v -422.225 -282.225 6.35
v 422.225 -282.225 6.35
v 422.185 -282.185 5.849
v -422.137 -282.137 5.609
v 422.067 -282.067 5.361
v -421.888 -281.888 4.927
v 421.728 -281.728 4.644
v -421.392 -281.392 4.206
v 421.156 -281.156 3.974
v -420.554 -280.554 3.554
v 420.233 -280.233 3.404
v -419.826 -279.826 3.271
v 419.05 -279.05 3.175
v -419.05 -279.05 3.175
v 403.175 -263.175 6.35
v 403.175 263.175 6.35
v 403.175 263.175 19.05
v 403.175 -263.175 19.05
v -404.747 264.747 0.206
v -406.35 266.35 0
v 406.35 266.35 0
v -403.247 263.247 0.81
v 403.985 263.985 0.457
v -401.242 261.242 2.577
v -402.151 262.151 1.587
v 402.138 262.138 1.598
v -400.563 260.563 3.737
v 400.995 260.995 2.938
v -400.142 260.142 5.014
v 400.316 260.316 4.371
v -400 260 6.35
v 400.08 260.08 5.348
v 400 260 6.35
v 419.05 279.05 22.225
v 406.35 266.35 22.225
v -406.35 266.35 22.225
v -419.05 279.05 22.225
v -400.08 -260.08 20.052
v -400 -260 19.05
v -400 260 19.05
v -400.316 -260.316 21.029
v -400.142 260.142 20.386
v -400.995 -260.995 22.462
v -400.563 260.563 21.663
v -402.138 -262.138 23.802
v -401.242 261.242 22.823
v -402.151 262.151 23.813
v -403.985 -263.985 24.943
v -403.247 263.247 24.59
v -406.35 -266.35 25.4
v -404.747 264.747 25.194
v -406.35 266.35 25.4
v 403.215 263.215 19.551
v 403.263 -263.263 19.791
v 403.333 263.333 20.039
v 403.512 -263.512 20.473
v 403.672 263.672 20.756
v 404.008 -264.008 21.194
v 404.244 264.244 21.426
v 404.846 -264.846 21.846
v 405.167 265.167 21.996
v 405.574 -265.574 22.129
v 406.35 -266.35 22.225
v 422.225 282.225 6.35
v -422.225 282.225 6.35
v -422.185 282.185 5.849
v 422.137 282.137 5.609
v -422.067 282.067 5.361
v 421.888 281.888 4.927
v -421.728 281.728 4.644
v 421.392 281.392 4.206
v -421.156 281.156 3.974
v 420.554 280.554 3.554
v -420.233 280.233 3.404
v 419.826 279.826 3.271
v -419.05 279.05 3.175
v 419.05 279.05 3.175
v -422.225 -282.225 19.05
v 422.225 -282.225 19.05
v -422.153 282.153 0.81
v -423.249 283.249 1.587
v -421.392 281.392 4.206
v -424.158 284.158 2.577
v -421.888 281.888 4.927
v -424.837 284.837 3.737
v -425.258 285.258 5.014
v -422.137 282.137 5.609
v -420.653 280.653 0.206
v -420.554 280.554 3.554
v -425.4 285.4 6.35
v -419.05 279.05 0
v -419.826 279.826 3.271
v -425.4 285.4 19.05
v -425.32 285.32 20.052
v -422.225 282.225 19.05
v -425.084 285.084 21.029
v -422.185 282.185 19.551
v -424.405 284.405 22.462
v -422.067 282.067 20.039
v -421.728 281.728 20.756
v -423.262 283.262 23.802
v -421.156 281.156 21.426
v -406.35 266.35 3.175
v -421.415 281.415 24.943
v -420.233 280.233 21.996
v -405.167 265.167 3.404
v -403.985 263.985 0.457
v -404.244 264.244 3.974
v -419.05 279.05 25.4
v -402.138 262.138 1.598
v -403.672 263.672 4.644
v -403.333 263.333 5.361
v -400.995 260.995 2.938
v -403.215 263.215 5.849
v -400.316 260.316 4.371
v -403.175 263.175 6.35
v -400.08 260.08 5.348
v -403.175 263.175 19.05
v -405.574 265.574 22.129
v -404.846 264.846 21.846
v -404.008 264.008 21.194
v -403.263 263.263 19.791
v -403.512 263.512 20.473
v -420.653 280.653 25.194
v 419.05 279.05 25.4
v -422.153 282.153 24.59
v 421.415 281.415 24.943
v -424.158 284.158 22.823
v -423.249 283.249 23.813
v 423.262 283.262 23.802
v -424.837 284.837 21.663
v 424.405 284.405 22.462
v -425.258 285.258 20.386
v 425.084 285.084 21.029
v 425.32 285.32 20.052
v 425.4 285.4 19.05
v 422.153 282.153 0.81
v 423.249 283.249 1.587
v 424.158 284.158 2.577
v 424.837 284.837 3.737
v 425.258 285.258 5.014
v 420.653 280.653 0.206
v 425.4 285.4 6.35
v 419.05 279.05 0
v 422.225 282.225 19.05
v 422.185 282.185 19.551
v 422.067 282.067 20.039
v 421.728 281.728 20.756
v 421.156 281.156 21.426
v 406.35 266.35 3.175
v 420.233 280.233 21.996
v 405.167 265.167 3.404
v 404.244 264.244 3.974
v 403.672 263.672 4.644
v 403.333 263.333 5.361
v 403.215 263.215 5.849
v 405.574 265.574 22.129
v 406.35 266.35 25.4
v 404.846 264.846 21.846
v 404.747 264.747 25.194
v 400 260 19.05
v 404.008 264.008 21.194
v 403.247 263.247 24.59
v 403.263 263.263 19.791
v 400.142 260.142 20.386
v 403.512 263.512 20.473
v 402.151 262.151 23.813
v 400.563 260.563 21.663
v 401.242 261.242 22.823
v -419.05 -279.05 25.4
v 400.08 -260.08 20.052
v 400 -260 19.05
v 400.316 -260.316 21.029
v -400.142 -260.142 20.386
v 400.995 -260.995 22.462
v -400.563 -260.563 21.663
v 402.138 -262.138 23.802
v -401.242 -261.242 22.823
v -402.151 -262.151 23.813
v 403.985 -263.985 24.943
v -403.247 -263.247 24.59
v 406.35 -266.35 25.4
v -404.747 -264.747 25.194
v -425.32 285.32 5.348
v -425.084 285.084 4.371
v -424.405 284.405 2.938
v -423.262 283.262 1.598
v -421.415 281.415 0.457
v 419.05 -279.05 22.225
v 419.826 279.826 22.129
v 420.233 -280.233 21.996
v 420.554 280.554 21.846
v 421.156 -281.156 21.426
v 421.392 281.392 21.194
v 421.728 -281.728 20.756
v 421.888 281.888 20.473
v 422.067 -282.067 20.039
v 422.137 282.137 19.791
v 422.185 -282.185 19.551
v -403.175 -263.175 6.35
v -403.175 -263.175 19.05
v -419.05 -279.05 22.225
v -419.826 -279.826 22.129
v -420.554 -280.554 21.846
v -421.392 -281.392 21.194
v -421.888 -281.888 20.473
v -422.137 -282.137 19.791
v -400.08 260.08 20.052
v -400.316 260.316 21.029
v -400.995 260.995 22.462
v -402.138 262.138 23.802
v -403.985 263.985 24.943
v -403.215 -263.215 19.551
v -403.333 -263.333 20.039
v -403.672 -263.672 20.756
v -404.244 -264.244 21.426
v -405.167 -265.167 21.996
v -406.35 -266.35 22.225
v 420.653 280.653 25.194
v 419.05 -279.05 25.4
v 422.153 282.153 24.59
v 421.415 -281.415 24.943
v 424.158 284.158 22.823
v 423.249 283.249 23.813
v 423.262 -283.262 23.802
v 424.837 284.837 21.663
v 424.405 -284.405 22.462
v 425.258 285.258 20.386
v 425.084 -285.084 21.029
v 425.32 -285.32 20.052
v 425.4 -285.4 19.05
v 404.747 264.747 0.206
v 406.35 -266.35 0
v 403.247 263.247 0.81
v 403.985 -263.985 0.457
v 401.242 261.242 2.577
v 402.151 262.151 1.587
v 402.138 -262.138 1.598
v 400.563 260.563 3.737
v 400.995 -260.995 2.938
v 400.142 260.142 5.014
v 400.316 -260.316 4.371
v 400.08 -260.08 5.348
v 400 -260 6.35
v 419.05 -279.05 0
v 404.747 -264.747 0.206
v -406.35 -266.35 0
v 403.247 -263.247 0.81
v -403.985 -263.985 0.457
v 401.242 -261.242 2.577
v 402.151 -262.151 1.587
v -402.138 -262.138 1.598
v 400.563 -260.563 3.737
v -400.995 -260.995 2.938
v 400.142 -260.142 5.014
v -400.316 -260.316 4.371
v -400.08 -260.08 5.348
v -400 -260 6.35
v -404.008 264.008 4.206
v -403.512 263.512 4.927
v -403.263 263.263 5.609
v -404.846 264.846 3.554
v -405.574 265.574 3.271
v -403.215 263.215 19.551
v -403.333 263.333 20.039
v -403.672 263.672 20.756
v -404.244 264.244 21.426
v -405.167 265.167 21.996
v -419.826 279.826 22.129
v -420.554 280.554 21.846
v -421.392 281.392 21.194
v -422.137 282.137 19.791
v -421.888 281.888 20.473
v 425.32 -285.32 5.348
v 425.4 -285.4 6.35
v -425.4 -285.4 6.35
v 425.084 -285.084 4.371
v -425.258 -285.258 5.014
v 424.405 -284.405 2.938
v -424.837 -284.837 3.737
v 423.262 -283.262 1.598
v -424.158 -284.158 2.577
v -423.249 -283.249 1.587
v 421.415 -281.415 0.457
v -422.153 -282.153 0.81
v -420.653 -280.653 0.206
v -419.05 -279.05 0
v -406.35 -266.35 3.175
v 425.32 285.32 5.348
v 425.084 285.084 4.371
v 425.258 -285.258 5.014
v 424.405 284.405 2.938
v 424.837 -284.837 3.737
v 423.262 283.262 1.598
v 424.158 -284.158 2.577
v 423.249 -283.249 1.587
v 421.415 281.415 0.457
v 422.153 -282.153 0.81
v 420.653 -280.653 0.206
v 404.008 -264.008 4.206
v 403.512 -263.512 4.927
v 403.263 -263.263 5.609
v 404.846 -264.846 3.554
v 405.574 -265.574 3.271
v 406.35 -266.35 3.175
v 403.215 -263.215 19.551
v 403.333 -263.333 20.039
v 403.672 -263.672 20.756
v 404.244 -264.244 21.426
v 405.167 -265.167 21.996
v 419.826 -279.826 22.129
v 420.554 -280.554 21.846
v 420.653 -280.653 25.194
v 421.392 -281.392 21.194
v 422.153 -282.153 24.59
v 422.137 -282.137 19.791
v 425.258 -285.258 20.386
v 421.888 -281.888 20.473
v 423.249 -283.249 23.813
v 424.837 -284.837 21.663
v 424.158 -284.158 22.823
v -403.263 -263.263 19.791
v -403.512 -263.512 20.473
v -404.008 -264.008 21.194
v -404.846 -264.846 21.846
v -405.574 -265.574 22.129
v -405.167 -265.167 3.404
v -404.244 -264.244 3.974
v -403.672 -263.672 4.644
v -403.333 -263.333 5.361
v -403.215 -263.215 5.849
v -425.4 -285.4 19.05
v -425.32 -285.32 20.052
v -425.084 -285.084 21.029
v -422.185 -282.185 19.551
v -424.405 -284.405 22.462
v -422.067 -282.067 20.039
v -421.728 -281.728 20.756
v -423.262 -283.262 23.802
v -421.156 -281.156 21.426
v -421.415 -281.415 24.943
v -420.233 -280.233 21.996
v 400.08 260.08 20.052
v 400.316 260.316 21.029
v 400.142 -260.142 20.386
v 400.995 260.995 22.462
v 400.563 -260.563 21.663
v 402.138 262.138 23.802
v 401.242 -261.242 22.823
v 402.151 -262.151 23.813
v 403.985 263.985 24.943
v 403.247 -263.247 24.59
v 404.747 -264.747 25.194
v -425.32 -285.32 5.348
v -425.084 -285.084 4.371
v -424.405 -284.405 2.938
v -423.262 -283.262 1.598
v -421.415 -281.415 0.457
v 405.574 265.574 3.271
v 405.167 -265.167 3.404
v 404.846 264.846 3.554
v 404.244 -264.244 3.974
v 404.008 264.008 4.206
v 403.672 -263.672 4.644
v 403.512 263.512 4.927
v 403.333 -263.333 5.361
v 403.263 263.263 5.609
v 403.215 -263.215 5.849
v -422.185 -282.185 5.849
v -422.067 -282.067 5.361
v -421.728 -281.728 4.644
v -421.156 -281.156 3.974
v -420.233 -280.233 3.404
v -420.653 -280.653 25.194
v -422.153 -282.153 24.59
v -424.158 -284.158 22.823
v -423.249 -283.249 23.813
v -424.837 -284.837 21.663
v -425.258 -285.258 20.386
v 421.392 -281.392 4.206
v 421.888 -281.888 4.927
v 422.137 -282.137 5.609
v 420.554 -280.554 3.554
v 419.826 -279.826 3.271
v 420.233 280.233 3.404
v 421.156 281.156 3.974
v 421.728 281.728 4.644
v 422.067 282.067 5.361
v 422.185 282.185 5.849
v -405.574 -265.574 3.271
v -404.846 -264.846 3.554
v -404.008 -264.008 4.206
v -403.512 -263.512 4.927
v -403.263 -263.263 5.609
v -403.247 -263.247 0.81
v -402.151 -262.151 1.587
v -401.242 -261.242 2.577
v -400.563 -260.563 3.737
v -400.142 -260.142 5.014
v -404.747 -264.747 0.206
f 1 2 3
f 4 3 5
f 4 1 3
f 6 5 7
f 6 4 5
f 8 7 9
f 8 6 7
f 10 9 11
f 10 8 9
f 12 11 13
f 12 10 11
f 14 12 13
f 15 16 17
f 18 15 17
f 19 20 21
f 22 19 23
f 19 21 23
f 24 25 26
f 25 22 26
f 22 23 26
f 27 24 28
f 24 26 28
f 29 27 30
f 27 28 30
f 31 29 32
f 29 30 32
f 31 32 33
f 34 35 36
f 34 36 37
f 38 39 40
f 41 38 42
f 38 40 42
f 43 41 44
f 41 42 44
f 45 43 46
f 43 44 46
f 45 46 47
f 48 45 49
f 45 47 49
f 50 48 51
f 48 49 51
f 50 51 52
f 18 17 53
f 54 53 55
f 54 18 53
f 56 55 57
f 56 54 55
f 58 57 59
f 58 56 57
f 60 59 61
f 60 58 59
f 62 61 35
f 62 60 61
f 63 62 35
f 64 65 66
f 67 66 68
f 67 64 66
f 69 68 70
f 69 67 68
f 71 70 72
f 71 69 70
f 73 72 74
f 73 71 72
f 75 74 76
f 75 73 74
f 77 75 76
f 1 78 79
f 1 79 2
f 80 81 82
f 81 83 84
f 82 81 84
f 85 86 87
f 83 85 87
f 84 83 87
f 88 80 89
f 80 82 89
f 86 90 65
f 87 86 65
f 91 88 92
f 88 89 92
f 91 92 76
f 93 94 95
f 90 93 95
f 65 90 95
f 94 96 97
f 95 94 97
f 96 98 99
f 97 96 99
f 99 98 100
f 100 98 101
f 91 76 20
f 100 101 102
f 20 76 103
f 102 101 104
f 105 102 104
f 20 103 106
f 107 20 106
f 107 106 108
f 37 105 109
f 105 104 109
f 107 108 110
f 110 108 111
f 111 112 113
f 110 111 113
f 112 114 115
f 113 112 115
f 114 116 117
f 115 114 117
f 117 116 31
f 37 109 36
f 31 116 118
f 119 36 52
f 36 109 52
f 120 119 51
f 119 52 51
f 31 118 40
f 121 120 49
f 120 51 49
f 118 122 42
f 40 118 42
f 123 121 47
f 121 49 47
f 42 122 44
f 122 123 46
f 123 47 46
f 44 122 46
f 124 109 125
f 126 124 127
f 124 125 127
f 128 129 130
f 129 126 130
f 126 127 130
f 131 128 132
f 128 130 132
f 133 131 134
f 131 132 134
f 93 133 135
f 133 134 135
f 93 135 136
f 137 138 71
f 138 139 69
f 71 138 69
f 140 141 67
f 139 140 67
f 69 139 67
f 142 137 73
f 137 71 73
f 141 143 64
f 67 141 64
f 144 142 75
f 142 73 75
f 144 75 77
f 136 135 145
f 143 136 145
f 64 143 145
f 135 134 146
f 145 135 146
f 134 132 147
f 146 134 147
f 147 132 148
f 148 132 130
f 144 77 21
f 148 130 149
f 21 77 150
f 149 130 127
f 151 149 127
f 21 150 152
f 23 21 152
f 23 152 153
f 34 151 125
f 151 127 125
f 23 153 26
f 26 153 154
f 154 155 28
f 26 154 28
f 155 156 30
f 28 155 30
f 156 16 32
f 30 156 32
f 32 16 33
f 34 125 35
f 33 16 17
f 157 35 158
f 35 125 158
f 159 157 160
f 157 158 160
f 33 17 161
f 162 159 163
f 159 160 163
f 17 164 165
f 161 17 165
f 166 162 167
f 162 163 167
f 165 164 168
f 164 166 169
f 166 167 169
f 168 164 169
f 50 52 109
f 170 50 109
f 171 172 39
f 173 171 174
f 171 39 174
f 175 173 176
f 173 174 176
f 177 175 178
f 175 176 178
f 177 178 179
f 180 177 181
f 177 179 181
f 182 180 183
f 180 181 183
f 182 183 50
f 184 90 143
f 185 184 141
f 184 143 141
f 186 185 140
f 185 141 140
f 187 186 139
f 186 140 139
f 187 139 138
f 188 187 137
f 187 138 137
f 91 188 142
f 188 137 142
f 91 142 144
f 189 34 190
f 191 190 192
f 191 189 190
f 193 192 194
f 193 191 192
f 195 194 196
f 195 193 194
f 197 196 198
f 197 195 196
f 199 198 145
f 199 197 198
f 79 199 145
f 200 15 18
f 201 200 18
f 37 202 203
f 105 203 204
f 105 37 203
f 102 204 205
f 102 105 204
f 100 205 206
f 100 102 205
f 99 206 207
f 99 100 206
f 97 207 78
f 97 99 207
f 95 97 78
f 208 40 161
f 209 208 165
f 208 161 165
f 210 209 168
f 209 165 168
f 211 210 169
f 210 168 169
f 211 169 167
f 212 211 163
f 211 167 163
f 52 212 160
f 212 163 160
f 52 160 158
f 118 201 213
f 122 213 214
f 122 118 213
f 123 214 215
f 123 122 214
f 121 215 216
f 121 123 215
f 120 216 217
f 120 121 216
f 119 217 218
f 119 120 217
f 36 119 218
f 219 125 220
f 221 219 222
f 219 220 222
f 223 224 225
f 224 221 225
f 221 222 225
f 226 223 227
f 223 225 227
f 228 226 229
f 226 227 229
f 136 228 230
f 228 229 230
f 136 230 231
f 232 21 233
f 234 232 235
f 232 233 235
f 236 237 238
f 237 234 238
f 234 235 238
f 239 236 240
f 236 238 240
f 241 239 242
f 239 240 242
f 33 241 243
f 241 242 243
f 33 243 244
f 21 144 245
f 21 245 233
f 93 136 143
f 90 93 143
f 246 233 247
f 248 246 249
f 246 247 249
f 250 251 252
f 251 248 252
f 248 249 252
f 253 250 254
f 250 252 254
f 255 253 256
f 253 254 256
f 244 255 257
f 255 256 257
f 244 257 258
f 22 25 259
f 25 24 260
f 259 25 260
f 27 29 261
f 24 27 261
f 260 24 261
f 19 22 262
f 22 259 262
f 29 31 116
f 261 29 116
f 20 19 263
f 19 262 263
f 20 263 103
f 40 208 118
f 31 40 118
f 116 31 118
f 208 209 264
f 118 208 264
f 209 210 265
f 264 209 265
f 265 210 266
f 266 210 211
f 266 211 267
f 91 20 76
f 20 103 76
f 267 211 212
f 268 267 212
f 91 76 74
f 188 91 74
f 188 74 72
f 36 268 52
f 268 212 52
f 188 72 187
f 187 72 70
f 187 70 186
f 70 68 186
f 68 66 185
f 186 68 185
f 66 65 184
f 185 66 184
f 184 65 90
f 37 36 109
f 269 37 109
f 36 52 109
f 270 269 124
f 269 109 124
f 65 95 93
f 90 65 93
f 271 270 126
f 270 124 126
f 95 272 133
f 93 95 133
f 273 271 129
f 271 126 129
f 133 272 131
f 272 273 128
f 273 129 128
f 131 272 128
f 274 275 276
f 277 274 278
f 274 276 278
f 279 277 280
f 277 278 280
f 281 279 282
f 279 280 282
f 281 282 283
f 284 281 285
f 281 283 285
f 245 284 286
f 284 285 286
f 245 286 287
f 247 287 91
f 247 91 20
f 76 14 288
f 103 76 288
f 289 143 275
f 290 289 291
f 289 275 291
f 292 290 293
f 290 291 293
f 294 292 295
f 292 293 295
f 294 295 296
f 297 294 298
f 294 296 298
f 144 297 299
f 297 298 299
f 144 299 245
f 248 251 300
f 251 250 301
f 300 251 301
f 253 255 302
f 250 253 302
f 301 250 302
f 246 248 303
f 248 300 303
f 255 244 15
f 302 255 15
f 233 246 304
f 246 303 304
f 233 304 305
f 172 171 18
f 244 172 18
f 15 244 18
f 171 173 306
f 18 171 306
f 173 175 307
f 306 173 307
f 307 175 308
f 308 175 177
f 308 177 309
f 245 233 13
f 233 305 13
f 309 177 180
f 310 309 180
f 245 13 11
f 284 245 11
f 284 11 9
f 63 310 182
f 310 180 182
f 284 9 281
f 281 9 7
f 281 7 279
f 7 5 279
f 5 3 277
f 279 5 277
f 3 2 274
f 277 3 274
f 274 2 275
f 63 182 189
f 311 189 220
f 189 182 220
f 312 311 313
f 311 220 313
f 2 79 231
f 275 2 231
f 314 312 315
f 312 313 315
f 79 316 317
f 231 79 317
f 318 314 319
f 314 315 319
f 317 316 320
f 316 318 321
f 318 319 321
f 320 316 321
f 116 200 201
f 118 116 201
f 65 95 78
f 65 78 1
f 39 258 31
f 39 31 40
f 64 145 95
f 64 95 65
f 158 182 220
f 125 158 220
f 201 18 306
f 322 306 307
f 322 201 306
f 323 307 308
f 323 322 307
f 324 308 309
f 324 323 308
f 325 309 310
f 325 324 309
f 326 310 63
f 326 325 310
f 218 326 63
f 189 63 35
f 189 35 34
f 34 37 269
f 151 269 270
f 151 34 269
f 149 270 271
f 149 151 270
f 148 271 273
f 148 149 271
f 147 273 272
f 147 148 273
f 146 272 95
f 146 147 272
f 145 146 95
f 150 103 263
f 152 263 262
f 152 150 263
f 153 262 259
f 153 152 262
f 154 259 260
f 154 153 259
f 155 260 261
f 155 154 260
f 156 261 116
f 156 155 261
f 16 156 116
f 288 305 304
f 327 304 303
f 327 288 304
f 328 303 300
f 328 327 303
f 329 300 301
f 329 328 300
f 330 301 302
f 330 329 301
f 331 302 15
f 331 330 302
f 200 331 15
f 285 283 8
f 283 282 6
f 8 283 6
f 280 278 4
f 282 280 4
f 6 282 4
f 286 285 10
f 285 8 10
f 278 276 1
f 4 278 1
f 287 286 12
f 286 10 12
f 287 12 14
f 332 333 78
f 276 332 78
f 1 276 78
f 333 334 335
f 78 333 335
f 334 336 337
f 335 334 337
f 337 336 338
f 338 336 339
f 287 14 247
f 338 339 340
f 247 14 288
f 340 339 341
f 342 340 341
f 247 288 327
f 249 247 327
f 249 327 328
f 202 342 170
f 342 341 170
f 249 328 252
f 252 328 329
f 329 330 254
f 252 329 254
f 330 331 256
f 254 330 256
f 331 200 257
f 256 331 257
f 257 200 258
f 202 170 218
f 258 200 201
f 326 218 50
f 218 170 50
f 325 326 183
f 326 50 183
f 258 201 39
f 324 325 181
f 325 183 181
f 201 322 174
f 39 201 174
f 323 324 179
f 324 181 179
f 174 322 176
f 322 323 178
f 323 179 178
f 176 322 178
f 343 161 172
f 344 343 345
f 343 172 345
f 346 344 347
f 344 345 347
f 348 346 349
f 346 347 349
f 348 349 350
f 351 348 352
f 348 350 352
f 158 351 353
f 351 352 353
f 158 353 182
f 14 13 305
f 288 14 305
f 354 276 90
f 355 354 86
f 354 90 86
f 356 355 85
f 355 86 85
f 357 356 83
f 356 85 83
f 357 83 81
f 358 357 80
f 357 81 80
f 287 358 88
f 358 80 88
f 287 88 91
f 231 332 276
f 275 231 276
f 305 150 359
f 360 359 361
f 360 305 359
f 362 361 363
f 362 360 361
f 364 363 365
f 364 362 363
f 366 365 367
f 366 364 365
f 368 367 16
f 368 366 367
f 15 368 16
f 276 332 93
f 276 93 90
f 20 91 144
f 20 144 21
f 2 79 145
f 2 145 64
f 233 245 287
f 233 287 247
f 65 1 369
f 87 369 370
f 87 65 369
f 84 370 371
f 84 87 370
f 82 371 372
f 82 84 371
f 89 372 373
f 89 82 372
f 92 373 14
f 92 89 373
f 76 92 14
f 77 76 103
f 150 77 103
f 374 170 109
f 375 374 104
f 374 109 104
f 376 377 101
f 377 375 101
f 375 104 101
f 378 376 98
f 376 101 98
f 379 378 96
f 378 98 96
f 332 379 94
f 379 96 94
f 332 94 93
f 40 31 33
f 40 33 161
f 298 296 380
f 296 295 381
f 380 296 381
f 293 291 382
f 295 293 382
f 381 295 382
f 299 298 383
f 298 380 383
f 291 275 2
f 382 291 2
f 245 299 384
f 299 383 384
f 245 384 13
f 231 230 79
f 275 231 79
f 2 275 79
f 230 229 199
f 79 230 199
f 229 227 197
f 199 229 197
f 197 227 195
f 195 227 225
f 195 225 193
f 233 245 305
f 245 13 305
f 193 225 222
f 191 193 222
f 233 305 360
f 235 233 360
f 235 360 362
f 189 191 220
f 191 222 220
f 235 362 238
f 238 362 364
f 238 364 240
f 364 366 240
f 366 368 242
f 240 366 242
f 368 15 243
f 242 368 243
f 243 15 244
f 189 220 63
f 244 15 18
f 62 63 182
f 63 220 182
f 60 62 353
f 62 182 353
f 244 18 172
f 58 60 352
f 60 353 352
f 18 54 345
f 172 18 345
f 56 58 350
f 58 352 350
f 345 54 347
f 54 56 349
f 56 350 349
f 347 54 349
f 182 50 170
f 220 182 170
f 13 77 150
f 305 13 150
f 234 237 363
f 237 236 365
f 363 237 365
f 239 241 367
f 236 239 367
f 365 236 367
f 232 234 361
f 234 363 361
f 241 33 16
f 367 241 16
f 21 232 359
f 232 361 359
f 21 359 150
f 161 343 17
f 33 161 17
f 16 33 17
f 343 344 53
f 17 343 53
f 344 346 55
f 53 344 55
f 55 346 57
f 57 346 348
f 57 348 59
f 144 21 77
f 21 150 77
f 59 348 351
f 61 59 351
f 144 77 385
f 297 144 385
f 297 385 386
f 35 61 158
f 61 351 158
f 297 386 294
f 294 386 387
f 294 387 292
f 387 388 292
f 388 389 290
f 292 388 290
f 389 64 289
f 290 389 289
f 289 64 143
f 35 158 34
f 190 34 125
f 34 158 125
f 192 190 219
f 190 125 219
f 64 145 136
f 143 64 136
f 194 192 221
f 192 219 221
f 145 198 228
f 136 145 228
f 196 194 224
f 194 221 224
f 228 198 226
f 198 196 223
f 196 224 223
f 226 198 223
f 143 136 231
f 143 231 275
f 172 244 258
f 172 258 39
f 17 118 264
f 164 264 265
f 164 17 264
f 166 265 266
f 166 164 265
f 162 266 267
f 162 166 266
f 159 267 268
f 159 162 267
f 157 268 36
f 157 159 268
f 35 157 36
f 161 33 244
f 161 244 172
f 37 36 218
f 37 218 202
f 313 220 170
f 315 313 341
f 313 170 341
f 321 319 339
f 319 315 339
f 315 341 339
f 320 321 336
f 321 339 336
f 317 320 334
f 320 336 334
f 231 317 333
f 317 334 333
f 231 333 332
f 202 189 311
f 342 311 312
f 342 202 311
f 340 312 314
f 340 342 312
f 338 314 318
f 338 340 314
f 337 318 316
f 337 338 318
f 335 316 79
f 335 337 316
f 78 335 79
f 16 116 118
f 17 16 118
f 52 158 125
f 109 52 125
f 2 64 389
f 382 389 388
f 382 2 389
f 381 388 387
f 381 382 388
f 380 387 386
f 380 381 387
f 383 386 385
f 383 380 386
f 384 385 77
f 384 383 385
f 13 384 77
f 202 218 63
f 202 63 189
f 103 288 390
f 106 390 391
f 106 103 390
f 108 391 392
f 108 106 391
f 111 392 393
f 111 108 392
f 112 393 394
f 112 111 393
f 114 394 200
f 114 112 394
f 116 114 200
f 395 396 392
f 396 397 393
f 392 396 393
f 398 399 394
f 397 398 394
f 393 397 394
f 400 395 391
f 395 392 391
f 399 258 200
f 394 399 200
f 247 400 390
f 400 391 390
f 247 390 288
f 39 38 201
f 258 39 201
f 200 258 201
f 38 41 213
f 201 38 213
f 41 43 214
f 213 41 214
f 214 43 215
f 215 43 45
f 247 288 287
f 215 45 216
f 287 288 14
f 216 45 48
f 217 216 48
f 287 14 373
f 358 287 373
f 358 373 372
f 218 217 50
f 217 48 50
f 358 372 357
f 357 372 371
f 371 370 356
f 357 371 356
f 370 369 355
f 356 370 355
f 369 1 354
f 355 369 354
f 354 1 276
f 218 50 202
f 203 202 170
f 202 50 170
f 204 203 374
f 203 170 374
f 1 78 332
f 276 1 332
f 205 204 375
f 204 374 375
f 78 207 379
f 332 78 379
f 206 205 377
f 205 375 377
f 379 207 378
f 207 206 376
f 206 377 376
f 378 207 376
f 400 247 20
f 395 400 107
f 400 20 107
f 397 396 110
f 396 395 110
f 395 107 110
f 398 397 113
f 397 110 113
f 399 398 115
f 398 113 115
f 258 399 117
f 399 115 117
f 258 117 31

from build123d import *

# Parameters (mm, degrees)
TUBO_CUADRADO_2_X_2_X_0_25_1_DEPTH      = 556.921024484
TUBO_CUADRADO_2_X_2_X_0_25_1_DEPTH_BACK = 36.921024484
TUBO_CUADRADO_2_X_2_X_0_25_1_2_DEPTH    = 873.842048969
TUBO_CUADRADO_2_X_2_X_0_25_1_3_DEPTH    = 593.842048969
TUBO_CUADRADO_2_X_2_X_0_25_1_4_DEPTH    = 873.842048969


with BuildPart() as part:
    # Sketch1 → Tubo cuadrado 2 X 2 X 0.25(1) (new, two sides: drawn at the far end of the back side and taken through both)
    with BuildSketch(Plane(origin=(-412.7, 260, 12.7), x_dir=(1, 0, 0), z_dir=(0, -1, 0)).offset(-TUBO_CUADRADO_2_X_2_X_0_25_1_DEPTH_BACK)):
        with BuildLine():
            Line((-6.35, -12.7), (6.35, -12.7))
            ThreePointArc((6.35, -12.7), (10.840128061, -10.840128061), (12.7, -6.35))
            Line((12.7, -6.35), (12.7, 6.35))
            ThreePointArc((12.7, 6.35), (10.840128061, 10.840128061), (6.35, 12.7))
            Line((6.35, 12.7), (-6.35, 12.7))
            ThreePointArc((-6.35, 12.7), (-10.840128061, 10.840128061), (-12.7, 6.35))
            Line((-12.7, 6.35), (-12.7, -6.35))
            ThreePointArc((-12.7, -6.35), (-10.840128061, -10.840128061), (-6.35, -12.7))
        make_face()
        with BuildLine():
            Line((-6.35, -9.525), (6.35, -9.525))
            ThreePointArc((6.35, -9.525), (8.59506403, -8.59506403), (9.525, -6.35))
            Line((9.525, -6.35), (9.525, 6.35))
            ThreePointArc((9.525, 6.35), (8.59506403, 8.59506403), (6.35, 9.525))
            Line((6.35, 9.525), (-6.35, 9.525))
            ThreePointArc((-6.35, 9.525), (-8.59506403, 8.59506403), (-9.525, 6.35))
            Line((-9.525, 6.35), (-9.525, -6.35))
            ThreePointArc((-9.525, -6.35), (-8.59506403, -8.59506403), (-6.35, -9.525))
        make_face(mode=Mode.SUBTRACT)
    extrude(amount=TUBO_CUADRADO_2_X_2_X_0_25_1_DEPTH + TUBO_CUADRADO_2_X_2_X_0_25_1_DEPTH_BACK)

    # Tubo cuadrado 2 X 2 X 0.25(1) mitre 1
    split(bisect_by=Plane(origin=(-400, 260, 0), x_dir=(0.707106781, -0.707106781, 0), z_dir=(-0.707106781, -0.707106781, 0)), keep=Keep.TOP)

    # Tubo cuadrado 2 X 2 X 0.25(1) mitre 2
    split(bisect_by=Plane(origin=(-400, -260, 0), x_dir=(-0.707106781, -0.707106781, 0), z_dir=(-0.707106781, 0.707106781, 0)), keep=Keep.TOP)


with BuildPart() as body_2:
    # Sketch1 on segment 2 (carried to segment 2) → Tubo cuadrado 2 X 2 X 0.25_1 2 (new body)
    with BuildSketch(Plane(origin=(-436.921024484, -272.7, 12.7), x_dir=(0, 1, 0), z_dir=(1, 0, 0))):
        with BuildLine():
            Line((-6.35, -12.7), (6.35, -12.7))
            ThreePointArc((6.35, -12.7), (10.840128061, -10.840128061), (12.7, -6.35))
            Line((12.7, -6.35), (12.7, 6.35))
            ThreePointArc((12.7, 6.35), (10.840128061, 10.840128061), (6.35, 12.7))
            Line((6.35, 12.7), (-6.35, 12.7))
            ThreePointArc((-6.35, 12.7), (-10.840128061, 10.840128061), (-12.7, 6.35))
            Line((-12.7, 6.35), (-12.7, -6.35))
            ThreePointArc((-12.7, -6.35), (-10.840128061, -10.840128061), (-6.35, -12.7))
        make_face()
        with BuildLine():
            Line((-6.35, -9.525), (6.35, -9.525))
            ThreePointArc((6.35, -9.525), (8.59506403, -8.59506403), (9.525, -6.35))
            Line((9.525, -6.35), (9.525, 6.35))
            ThreePointArc((9.525, 6.35), (8.59506403, 8.59506403), (6.35, 9.525))
            Line((6.35, 9.525), (-6.35, 9.525))
            ThreePointArc((-6.35, 9.525), (-8.59506403, 8.59506403), (-9.525, 6.35))
            Line((-9.525, 6.35), (-9.525, -6.35))
            ThreePointArc((-9.525, -6.35), (-8.59506403, -8.59506403), (-6.35, -9.525))
        make_face(mode=Mode.SUBTRACT)
    extrude(amount=TUBO_CUADRADO_2_X_2_X_0_25_1_2_DEPTH)

    # Tubo cuadrado 2 X 2 X 0.25_1 2 mitre 1
    split(bisect_by=Plane(origin=(-400, -260, 0), x_dir=(0.707106781, 0.707106781, 0), z_dir=(0.707106781, -0.707106781, 0)), keep=Keep.TOP)

    # Tubo cuadrado 2 X 2 X 0.25_1 2 mitre 2
    split(bisect_by=Plane(origin=(400, -260, 0), x_dir=(0.707106781, -0.707106781, 0), z_dir=(-0.707106781, -0.707106781, 0)), keep=Keep.TOP)


with BuildPart() as body_3:
    # Sketch1 on segment 3 (carried to segment 3) → Tubo cuadrado 2 X 2 X 0.25_1 3 (new body)
    with BuildSketch(Plane(origin=(412.7, -296.921024484, 12.7), x_dir=(-1, 0, 0), z_dir=(0, 1, 0))):
        with BuildLine():
            Line((-6.35, -12.7), (6.35, -12.7))
            ThreePointArc((6.35, -12.7), (10.840128061, -10.840128061), (12.7, -6.35))
            Line((12.7, -6.35), (12.7, 6.35))
            ThreePointArc((12.7, 6.35), (10.840128061, 10.840128061), (6.35, 12.7))
            Line((6.35, 12.7), (-6.35, 12.7))
            ThreePointArc((-6.35, 12.7), (-10.840128061, 10.840128061), (-12.7, 6.35))
            Line((-12.7, 6.35), (-12.7, -6.35))
            ThreePointArc((-12.7, -6.35), (-10.840128061, -10.840128061), (-6.35, -12.7))
        make_face()
        with BuildLine():
            Line((-6.35, -9.525), (6.35, -9.525))
            ThreePointArc((6.35, -9.525), (8.59506403, -8.59506403), (9.525, -6.35))
            Line((9.525, -6.35), (9.525, 6.35))
            ThreePointArc((9.525, 6.35), (8.59506403, 8.59506403), (6.35, 9.525))
            Line((6.35, 9.525), (-6.35, 9.525))
            ThreePointArc((-6.35, 9.525), (-8.59506403, 8.59506403), (-9.525, 6.35))
            Line((-9.525, 6.35), (-9.525, -6.35))
            ThreePointArc((-9.525, -6.35), (-8.59506403, -8.59506403), (-6.35, -9.525))
        make_face(mode=Mode.SUBTRACT)
    extrude(amount=TUBO_CUADRADO_2_X_2_X_0_25_1_3_DEPTH)

    # Tubo cuadrado 2 X 2 X 0.25_1 3 mitre 1
    split(bisect_by=Plane(origin=(400, 260, 0), x_dir=(0.707106781, 0.707106781, 0), z_dir=(0.707106781, -0.707106781, 0)), keep=Keep.TOP)

    # Tubo cuadrado 2 X 2 X 0.25_1 3 mitre 2
    split(bisect_by=Plane(origin=(400, -260, 0), x_dir=(-0.707106781, 0.707106781, 0), z_dir=(0.707106781, 0.707106781, 0)), keep=Keep.TOP)


with BuildPart() as body_4:
    # Sketch1 on segment 4 (carried to segment 4) → Tubo cuadrado 2 X 2 X 0.25_1 4 (new body)
    with BuildSketch(Plane(origin=(436.921024484, 272.7, 12.7), x_dir=(0, -1, 0), z_dir=(-1, 0, 0))):
        with BuildLine():
            Line((-6.35, -12.7), (6.35, -12.7))
            ThreePointArc((6.35, -12.7), (10.840128061, -10.840128061), (12.7, -6.35))
            Line((12.7, -6.35), (12.7, 6.35))
            ThreePointArc((12.7, 6.35), (10.840128061, 10.840128061), (6.35, 12.7))
            Line((6.35, 12.7), (-6.35, 12.7))
            ThreePointArc((-6.35, 12.7), (-10.840128061, 10.840128061), (-12.7, 6.35))
            Line((-12.7, 6.35), (-12.7, -6.35))
            ThreePointArc((-12.7, -6.35), (-10.840128061, -10.840128061), (-6.35, -12.7))
        make_face()
        with BuildLine():
            Line((-6.35, -9.525), (6.35, -9.525))
            ThreePointArc((6.35, -9.525), (8.59506403, -8.59506403), (9.525, -6.35))
            Line((9.525, -6.35), (9.525, 6.35))
            ThreePointArc((9.525, 6.35), (8.59506403, 8.59506403), (6.35, 9.525))
            Line((6.35, 9.525), (-6.35, 9.525))
            ThreePointArc((-6.35, 9.525), (-8.59506403, 8.59506403), (-9.525, 6.35))
            Line((-9.525, 6.35), (-9.525, -6.35))
            ThreePointArc((-9.525, -6.35), (-8.59506403, -8.59506403), (-6.35, -9.525))
        make_face(mode=Mode.SUBTRACT)
    extrude(amount=TUBO_CUADRADO_2_X_2_X_0_25_1_4_DEPTH)

    # Tubo cuadrado 2 X 2 X 0.25_1 4 mitre 1
    split(bisect_by=Plane(origin=(-400, 260, 0), x_dir=(-0.707106781, 0.707106781, 0), z_dir=(0.707106781, 0.707106781, 0)), keep=Keep.TOP)

    # Tubo cuadrado 2 X 2 X 0.25_1 4 mitre 2
    split(bisect_by=Plane(origin=(400, 260, 0), x_dir=(-0.707106781, -0.707106781, 0), z_dir=(-0.707106781, 0.707106781, 0)), keep=Keep.TOP)


solid = Compound([part.part, body_2.part, body_3.part, body_4.part])
